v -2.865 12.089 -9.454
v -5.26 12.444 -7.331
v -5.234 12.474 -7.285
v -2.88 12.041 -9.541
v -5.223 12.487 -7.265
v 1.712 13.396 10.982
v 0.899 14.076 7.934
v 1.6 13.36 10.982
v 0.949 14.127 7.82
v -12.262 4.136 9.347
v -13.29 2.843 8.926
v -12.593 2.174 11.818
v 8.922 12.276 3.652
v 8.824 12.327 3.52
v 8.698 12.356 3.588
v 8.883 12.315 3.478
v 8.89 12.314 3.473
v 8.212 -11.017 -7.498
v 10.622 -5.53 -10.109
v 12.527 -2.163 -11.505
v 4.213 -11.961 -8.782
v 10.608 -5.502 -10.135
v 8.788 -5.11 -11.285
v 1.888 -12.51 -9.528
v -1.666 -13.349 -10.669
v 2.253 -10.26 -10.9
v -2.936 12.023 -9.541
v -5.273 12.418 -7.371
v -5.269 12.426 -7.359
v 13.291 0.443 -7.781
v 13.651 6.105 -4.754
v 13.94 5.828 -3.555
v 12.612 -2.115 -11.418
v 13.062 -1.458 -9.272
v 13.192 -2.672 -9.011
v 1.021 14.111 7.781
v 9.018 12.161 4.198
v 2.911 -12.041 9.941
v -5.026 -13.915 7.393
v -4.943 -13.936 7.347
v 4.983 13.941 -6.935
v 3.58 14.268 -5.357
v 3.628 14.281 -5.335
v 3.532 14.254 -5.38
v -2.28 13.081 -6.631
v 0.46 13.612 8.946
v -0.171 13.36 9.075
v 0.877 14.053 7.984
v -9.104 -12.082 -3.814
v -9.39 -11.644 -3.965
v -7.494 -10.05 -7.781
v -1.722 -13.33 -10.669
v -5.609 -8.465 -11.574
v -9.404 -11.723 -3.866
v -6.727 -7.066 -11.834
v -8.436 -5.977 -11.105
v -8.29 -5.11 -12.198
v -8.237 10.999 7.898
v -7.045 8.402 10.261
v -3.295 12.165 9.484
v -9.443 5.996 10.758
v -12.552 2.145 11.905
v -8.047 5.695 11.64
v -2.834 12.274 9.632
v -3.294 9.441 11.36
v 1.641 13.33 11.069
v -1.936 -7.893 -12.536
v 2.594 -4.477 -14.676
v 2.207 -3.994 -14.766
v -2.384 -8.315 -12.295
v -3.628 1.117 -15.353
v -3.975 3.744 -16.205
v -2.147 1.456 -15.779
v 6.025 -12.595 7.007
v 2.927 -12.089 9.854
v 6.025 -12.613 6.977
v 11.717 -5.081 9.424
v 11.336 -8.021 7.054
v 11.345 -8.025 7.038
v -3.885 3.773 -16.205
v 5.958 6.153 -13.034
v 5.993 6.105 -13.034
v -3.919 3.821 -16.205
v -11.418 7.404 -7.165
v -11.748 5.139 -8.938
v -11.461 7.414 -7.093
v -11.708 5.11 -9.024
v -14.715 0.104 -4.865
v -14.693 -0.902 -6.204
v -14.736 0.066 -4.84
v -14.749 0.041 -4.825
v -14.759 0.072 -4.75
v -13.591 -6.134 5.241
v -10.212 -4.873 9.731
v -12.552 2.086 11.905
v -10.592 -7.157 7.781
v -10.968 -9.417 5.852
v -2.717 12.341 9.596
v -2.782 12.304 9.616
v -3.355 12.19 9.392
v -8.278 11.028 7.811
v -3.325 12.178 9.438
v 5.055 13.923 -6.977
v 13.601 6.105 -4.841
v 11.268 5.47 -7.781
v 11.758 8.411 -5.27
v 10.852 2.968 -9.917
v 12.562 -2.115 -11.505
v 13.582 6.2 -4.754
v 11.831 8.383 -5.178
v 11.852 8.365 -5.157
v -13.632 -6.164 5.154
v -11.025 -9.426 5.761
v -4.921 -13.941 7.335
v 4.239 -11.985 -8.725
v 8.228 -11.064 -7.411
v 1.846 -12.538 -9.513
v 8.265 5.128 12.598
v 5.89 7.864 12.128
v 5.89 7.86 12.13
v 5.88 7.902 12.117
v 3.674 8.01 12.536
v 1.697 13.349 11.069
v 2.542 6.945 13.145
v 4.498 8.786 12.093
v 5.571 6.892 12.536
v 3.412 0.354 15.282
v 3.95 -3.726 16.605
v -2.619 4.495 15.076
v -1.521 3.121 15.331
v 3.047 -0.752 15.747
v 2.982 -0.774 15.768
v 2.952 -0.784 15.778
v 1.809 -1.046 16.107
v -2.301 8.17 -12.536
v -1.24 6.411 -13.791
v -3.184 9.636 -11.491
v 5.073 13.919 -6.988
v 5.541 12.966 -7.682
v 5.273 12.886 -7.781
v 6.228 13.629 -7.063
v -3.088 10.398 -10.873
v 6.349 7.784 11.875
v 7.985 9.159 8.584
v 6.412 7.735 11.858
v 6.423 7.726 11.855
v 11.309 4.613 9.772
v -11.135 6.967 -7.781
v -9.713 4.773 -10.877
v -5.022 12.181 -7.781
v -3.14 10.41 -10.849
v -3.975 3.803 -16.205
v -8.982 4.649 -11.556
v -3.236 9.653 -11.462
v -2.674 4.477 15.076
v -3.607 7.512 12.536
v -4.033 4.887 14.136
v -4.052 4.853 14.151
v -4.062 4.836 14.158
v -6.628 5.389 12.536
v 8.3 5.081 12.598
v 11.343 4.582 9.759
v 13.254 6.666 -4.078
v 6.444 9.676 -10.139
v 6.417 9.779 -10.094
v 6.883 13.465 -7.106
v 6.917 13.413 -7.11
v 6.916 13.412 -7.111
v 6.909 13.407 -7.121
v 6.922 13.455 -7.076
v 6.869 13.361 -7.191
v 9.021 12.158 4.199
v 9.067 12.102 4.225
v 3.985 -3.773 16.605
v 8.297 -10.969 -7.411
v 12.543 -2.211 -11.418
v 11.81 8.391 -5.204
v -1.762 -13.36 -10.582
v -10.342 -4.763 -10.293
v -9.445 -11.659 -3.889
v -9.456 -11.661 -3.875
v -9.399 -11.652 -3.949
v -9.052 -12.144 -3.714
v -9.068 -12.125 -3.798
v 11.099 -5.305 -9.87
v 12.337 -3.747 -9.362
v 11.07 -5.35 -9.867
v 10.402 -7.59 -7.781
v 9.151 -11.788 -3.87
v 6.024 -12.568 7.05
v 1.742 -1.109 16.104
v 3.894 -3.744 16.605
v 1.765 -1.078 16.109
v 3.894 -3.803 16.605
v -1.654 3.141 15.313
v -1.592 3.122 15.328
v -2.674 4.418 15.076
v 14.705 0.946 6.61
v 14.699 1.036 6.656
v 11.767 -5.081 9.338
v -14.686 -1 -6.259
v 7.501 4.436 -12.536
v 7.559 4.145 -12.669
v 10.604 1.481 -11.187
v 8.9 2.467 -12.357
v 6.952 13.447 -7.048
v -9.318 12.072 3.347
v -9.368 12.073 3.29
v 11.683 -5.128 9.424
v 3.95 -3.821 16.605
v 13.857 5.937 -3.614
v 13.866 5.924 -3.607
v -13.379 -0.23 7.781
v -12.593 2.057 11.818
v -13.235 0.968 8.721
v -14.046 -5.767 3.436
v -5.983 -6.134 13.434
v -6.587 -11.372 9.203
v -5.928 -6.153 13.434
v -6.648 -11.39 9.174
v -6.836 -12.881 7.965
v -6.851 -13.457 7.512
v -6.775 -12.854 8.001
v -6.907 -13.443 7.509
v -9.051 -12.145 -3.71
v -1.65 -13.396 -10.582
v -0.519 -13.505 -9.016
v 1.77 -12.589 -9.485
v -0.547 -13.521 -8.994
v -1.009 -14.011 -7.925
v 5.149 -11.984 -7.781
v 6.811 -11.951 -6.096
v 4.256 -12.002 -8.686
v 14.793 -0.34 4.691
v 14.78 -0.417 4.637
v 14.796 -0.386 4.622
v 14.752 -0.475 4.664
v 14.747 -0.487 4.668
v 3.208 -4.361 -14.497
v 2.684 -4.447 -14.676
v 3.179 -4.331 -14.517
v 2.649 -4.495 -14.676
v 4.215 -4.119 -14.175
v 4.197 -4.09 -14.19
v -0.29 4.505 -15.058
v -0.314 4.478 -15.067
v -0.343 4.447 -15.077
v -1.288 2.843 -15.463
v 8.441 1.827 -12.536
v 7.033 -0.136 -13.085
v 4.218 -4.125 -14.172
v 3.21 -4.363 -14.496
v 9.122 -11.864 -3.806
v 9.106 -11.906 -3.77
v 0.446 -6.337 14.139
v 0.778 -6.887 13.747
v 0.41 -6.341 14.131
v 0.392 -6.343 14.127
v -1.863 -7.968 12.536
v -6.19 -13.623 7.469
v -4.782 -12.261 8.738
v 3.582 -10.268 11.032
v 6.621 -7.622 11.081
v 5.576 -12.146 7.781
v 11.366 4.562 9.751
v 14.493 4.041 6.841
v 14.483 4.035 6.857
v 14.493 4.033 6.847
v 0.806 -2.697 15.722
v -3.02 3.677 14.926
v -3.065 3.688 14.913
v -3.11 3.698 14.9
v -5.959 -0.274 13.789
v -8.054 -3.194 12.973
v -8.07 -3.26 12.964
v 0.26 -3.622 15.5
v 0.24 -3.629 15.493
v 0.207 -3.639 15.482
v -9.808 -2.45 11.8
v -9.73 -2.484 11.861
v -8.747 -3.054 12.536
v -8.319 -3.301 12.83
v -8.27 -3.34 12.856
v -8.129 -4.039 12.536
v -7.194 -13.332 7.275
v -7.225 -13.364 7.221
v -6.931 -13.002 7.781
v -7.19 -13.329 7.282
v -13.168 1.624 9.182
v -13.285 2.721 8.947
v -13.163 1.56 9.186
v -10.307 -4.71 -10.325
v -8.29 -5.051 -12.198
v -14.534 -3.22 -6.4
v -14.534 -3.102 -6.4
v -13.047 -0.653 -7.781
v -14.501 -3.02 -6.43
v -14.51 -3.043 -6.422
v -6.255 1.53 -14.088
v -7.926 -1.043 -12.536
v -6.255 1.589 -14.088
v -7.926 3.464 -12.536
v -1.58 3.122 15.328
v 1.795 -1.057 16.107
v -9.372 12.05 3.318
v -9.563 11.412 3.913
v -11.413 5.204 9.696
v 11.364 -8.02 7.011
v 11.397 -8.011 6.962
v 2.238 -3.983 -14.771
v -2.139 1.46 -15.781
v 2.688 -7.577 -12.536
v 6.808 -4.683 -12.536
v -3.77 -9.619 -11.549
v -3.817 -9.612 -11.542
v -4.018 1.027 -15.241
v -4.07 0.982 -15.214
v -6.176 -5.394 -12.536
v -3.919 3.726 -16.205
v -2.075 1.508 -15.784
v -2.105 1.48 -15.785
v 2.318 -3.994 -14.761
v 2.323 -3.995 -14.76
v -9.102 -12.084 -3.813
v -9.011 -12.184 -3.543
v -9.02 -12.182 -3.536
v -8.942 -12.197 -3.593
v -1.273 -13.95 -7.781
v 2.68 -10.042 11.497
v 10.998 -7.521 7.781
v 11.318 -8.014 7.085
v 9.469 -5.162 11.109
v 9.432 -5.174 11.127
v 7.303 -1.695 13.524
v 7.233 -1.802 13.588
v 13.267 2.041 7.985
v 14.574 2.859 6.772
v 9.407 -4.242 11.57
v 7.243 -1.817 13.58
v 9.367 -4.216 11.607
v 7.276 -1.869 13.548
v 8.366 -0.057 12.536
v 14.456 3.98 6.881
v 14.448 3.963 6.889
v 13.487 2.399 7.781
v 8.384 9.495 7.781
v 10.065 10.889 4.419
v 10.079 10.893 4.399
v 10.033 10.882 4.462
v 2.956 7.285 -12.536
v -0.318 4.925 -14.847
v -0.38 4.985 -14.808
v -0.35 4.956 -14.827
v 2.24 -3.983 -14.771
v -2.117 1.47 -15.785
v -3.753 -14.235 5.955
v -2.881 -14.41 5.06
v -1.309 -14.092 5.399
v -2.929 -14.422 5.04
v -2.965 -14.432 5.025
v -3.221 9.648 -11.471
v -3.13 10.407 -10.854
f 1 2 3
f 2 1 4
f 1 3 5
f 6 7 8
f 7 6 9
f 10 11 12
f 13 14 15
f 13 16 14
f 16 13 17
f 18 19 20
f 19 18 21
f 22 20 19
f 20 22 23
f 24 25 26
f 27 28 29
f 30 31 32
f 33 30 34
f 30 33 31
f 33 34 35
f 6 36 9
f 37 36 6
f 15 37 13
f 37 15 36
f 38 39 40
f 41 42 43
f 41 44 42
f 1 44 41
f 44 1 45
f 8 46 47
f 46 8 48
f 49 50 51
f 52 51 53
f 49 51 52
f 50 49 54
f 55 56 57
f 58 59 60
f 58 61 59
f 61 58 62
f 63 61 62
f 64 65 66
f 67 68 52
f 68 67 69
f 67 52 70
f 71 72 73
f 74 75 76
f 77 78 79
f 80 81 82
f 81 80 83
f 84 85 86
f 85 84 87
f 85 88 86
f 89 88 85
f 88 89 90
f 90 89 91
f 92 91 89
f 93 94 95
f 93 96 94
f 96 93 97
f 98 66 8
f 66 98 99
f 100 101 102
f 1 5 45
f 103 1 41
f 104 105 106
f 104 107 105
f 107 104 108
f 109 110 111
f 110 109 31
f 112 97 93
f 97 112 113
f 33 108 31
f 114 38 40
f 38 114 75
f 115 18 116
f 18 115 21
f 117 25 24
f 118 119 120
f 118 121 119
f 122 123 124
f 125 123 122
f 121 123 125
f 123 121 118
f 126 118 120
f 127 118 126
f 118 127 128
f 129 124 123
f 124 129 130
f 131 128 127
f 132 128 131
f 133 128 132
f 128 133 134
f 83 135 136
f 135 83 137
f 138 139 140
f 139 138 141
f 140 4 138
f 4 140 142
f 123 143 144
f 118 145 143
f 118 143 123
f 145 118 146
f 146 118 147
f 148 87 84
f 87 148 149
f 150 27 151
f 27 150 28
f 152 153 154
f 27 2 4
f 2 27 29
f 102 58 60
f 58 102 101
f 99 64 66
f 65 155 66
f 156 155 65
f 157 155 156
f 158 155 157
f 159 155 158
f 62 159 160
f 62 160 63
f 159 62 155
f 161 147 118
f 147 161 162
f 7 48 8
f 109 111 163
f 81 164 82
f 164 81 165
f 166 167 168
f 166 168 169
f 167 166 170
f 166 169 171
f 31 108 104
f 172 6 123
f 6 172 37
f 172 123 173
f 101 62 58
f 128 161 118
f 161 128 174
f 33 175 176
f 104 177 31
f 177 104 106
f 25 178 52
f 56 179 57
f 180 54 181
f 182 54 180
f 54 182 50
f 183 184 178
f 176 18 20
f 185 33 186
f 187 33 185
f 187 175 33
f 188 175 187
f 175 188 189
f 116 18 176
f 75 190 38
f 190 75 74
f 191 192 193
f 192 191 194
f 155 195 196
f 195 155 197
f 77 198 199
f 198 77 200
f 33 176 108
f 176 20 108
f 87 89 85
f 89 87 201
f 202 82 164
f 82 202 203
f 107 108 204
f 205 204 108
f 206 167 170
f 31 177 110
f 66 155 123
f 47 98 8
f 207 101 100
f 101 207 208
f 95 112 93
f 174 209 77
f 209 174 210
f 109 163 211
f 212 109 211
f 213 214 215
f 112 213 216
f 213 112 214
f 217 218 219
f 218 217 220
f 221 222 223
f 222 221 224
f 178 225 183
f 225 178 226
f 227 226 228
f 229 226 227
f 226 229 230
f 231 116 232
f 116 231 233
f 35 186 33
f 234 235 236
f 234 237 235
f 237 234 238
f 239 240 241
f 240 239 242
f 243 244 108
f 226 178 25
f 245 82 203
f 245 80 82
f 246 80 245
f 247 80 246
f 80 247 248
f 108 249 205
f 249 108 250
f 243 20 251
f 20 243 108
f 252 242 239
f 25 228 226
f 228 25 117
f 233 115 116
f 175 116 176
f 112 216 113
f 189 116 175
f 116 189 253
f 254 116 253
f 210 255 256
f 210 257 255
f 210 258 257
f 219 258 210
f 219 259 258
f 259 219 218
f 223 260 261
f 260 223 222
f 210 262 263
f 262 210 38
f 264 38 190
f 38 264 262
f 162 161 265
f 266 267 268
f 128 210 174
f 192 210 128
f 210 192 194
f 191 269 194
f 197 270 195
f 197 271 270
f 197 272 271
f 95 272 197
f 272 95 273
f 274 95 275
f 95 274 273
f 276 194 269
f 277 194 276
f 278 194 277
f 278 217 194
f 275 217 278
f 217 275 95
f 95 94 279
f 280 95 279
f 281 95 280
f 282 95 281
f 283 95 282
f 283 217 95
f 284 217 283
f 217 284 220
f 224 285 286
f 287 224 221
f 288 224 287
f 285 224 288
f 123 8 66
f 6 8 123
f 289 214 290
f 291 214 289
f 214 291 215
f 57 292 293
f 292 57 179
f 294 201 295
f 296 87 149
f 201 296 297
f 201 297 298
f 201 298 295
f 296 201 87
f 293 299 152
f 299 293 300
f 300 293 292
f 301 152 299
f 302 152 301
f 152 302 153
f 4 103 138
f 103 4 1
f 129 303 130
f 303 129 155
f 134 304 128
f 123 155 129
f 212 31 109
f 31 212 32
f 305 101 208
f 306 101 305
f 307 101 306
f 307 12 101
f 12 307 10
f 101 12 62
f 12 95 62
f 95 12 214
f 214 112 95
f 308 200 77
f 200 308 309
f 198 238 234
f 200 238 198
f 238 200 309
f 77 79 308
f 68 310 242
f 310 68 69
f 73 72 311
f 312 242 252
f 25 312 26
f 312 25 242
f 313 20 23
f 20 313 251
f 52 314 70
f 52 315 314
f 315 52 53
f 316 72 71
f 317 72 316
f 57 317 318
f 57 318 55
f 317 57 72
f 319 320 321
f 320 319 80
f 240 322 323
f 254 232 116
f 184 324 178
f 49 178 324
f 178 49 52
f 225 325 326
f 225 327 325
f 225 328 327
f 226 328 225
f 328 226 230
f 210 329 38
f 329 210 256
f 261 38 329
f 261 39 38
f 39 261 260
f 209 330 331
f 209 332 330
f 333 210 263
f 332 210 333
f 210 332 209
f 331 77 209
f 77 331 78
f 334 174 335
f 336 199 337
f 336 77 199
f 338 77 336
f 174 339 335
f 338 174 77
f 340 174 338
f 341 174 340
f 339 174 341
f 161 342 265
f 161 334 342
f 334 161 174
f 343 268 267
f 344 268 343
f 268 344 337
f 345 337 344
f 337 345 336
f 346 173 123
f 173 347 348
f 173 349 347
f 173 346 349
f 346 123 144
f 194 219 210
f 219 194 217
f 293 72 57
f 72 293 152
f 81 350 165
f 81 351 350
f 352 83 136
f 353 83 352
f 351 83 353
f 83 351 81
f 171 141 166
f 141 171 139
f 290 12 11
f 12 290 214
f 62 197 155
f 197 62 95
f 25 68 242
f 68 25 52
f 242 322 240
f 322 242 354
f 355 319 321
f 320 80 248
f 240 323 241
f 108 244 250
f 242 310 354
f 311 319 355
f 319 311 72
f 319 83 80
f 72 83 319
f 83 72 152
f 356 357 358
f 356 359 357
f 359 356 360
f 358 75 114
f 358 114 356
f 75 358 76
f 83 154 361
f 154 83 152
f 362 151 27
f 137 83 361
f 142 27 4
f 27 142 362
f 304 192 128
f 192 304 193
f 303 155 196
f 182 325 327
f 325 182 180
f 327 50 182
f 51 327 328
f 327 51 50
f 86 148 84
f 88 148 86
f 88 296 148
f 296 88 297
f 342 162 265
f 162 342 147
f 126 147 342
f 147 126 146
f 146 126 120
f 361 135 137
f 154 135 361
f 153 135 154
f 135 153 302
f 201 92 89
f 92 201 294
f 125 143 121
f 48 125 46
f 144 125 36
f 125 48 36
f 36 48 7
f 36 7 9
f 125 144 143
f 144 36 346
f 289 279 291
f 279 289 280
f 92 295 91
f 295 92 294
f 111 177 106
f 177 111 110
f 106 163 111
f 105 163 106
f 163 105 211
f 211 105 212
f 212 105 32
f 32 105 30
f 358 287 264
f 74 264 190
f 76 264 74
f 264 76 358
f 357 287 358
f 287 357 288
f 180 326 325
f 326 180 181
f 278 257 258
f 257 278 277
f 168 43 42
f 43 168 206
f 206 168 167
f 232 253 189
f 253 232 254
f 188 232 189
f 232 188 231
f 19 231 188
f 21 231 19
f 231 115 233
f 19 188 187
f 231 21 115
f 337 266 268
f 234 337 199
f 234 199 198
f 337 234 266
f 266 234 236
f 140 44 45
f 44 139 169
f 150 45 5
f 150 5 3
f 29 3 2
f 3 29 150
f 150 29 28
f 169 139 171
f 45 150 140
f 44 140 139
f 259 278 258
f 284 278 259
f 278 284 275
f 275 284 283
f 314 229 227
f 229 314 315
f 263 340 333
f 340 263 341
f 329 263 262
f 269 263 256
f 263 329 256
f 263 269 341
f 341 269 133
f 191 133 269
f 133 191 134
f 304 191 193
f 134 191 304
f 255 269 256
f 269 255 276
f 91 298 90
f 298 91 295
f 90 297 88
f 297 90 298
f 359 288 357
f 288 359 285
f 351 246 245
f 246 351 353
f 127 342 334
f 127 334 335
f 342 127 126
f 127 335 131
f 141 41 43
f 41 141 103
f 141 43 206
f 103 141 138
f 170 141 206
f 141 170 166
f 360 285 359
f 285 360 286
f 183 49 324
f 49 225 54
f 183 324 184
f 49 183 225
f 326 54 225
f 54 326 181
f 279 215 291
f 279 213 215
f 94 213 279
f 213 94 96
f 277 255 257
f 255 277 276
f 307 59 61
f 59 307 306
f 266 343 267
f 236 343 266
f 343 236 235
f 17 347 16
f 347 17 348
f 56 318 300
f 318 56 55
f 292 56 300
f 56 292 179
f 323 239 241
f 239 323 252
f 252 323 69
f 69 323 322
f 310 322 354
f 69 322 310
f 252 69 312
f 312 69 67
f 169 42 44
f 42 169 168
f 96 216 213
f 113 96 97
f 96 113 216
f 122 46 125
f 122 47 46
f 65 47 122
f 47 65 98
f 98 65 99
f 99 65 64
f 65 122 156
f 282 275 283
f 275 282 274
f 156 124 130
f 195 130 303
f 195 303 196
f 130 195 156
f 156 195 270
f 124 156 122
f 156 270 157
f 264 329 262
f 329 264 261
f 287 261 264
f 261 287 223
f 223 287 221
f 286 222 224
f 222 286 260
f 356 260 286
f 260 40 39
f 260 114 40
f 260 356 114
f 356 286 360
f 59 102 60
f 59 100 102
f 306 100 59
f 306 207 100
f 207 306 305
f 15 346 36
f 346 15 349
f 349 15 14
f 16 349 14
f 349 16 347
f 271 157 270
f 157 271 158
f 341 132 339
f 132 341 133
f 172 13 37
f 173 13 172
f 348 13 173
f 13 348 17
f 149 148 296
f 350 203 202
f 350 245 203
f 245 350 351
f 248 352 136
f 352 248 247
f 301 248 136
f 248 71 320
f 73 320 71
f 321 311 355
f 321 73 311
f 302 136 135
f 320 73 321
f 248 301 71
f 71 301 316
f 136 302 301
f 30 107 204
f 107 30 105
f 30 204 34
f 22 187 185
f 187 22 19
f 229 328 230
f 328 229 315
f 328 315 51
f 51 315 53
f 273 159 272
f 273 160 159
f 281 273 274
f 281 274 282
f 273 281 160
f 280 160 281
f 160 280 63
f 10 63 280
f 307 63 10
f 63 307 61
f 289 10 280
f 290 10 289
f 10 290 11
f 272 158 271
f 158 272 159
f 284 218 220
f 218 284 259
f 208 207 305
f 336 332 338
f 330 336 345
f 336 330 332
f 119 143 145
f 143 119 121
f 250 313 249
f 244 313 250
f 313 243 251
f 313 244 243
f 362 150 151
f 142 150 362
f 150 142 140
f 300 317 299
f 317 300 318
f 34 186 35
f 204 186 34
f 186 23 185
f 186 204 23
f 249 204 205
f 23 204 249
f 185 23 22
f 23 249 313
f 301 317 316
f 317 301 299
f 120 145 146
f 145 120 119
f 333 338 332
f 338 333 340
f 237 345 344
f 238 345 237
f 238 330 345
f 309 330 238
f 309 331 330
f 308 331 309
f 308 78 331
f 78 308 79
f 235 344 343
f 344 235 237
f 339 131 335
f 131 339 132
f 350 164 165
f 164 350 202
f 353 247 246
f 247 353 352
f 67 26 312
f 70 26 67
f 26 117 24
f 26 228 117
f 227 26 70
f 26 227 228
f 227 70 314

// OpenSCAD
// Auto-generated OpenSCAD file

    shift = 0.2;

    inner_points = 10*[[-1.4925768928517944, 0.3744972732538202, 0.7694208842939634], [0.10506355323964955, -1.5352510018008023, -0.7694208842939347], [-0.10506355323964955, 1.5352510018008023, 0.7694208842939347], [1.4925768928517944, -0.3744972732538202, -0.7694208842939634], [-0.8173996973653821, -1.3037989582358627, 0.7694208842937847], [-1.4276440459709443, -0.5743400271213236, -0.7694208842937383], [1.4276440459709443, 0.5743400271213236, 0.7694208842937383], [0.8173996973653821, 1.3037989582358627, -0.7694208842937847], [1.4125503771397584e-13, -1.2631123895450308e-13, 1.7204774005889667], [0.9873960974861977, -1.180289343940366, 0.7694208842936455], [-0.9873960974861977, 1.180289343940366, -0.7694208842936455], [-1.4125503771397584e-13, 1.2631123895450308e-13, -1.7204774005889667], [-0.6102443486053336, 0.7294589311143346, 1.2449491424414938], [0.9873960974861105, -1.180289343940288, -0.2938926261464043], [-0.9873960974861105, 1.180289343940288, 0.2938926261464043], [0.6102443486053336, -0.7294589311143346, -1.2449491424414938], [-1.427644045970857, -0.5743400271214016, 0.2938926261463116], [-0.8173996973654696, -1.3037989582357845, -0.2938926261462652], [0.8173996973654696, 1.3037989582357845, 0.2938926261462652], [1.427644045970857, 0.5743400271214016, -0.2938926261463116], [0.06493284688107887, -0.9488373003753483, 1.244949142441315], [-0.9224632506052604, 0.23145204356514415, -1.2449491424412973], [0.9224632506052604, -0.23145204356514415, 1.2449491424412973], [-0.06493284688107887, 0.9488373003753483, -1.244949142441315], [-0.8823325442463197, -0.3549616578606406, 1.2449491424414367], [0.10506355323973704, -1.5352510018008805, 0.2938926261461153], [-1.4925768928518819, 0.37449727325389837, -0.2938926261460865], [-0.5051807953658253, -0.8057920706863415, -1.2449491424414079], [0.5051807953658253, 0.8057920706863415, 1.2449491424414079], [1.4925768928518819, -0.37449727325389837, 0.2938926261460865], [-0.10506355323973704, 1.5352510018008805, -0.2938926261461153], [0.8823325442463197, 0.3549616578606406, -1.2449491424414367]];

    outer_points_unshifted = 10*[[1.0628525456970679, -1.330107906744217, 0.24738615252100915], [0.16810884819315208, 1.330107906744217, 1.078236920863433], [-0.16810884819315208, -1.330107906744217, -1.078236920863433], [-1.0628525456970679, 1.330107906744217, -0.24738615252100915], [0.3934802280314942, -0.37731459459103, 1.6318239772702994], [1.5982571461218291, 0.37731459459103, 0.5130792117368246], [-1.5982571461218291, -0.37731459459103, -0.5130792117368246], [-0.3934802280314942, 0.37731459459103, -1.6318239772702994], [-0.6981939930271678, -1.4325597335725755, 0.6483365204773054], [-1.251176009304342, 0.21154405657322783, 1.1618305348918885], [1.251176009304342, -0.21154405657322783, -1.1618305348918885], [0.6981939930271678, 1.4325597335725755, -0.6483365204773054], [0.07507530663137034, -1.5633011506528607, -0.06971423925335238], [-0.8196683908725453, 1.0969146628355733, 0.7611365290890716], [0.8196683908725453, -1.0969146628355733, -0.7611365290890716], [-0.07507530663137034, 1.5633011506528607, 0.06971423925335238], [1.1667495276900324, -0.5080560116713154, 0.9137732175396416], [0.8249878464632909, 0.5080560116713154, 1.2311299714674824], [-0.8249878464632909, -0.5080560116713154, -1.2311299714674824], [-1.1667495276900324, 0.5080560116713154, -0.9137732175396416], [-0.5942970110342034, -0.6105078384996738, 1.3147235854959378], [1.3550729912973065, 0.6105078384996738, -0.4954434698732562], [-1.3550729912973065, -0.6105078384996738, 0.4954434698732562], [0.5942970110342034, 0.6105078384996738, -1.3147235854959378], [0.28958324603852964, -1.1993664896639316, 0.965436912251667], [-0.26339877023864466, 0.44473730048187166, 1.47893092666625], [1.4943601641288646, -0.44473730048187166, -0.15330785328180774], [0.9413781478516903, 1.1993664896639316, 0.36018616113277535], [-0.9413781478516903, -1.1993664896639316, -0.36018616113277535], [-1.4943601641288646, 0.44473730048187166, 0.15330785328180774], [0.26339877023864466, -0.44473730048187166, -1.47893092666625], [-0.28958324603852964, 1.1993664896639316, -0.965436912251667]];
    
    outer_points = [for (p = outer_points_unshifted) [p[0], p[1], p[2] + shift]];

    // Convex hull for inner set (I)
    module inner_hull() {
        hull() {
            for (p = inner_points) {
                translate(p) sphere(r=0.1);
            }
        }
    }

    // Convex hull for outer set (O) minus inner hull (O \ I)
    module outer_minus_inner() {
        difference() {
            hull() {
                for (p = outer_points) {
                    translate(p) sphere(r=0.1);
                }
            }
            inner_hull(); // Subtract inner hull
        }
    }

    // Convex hull for outer set (O) minus all translated inner hulls
    module outer_minus_AllTranslationInner() {
        difference() {
            hull() {
                for (p = outer_points) {
                    translate(p) sphere(r=0.1);
                }
            }
            hull() {
                translate([0,0,50]) inner_hull();
                translate([0,0,-50]) inner_hull();
            }; // Subtract translated inner hulls
        }
    }

    // Difference between outer_minus_inner and outer_minus_AllTranslationInner
    module outer_minus_inner_diff() {
        difference() {
            // Outer minus inner
            difference() {
                hull() {
                    for (p = outer_points) {
                        translate(p) sphere(r=0.1);
                    }
                }
                inner_hull();
            }

            // Subtract Outer minus AllTranslationInner
            difference() {
                hull() {
                    for (p = outer_points) {
                        translate(p) sphere(r=0.1);
                    }
                }
                hull() {
                    translate([0,0,50]) inner_hull();
                    translate([0,0,-50]) inner_hull();
                };
            }
        }
    }

    // Rendering all with colors applied
    // color([1, 0, 0, 0.5]) inner_hull(); // Transparent red
    // color([0, 0, 1, 1]) outer_minus_inner(); // Opaque blue
    color([1, 1, 0, 1]) outer_minus_inner_diff(); // Opaque yellow
    
